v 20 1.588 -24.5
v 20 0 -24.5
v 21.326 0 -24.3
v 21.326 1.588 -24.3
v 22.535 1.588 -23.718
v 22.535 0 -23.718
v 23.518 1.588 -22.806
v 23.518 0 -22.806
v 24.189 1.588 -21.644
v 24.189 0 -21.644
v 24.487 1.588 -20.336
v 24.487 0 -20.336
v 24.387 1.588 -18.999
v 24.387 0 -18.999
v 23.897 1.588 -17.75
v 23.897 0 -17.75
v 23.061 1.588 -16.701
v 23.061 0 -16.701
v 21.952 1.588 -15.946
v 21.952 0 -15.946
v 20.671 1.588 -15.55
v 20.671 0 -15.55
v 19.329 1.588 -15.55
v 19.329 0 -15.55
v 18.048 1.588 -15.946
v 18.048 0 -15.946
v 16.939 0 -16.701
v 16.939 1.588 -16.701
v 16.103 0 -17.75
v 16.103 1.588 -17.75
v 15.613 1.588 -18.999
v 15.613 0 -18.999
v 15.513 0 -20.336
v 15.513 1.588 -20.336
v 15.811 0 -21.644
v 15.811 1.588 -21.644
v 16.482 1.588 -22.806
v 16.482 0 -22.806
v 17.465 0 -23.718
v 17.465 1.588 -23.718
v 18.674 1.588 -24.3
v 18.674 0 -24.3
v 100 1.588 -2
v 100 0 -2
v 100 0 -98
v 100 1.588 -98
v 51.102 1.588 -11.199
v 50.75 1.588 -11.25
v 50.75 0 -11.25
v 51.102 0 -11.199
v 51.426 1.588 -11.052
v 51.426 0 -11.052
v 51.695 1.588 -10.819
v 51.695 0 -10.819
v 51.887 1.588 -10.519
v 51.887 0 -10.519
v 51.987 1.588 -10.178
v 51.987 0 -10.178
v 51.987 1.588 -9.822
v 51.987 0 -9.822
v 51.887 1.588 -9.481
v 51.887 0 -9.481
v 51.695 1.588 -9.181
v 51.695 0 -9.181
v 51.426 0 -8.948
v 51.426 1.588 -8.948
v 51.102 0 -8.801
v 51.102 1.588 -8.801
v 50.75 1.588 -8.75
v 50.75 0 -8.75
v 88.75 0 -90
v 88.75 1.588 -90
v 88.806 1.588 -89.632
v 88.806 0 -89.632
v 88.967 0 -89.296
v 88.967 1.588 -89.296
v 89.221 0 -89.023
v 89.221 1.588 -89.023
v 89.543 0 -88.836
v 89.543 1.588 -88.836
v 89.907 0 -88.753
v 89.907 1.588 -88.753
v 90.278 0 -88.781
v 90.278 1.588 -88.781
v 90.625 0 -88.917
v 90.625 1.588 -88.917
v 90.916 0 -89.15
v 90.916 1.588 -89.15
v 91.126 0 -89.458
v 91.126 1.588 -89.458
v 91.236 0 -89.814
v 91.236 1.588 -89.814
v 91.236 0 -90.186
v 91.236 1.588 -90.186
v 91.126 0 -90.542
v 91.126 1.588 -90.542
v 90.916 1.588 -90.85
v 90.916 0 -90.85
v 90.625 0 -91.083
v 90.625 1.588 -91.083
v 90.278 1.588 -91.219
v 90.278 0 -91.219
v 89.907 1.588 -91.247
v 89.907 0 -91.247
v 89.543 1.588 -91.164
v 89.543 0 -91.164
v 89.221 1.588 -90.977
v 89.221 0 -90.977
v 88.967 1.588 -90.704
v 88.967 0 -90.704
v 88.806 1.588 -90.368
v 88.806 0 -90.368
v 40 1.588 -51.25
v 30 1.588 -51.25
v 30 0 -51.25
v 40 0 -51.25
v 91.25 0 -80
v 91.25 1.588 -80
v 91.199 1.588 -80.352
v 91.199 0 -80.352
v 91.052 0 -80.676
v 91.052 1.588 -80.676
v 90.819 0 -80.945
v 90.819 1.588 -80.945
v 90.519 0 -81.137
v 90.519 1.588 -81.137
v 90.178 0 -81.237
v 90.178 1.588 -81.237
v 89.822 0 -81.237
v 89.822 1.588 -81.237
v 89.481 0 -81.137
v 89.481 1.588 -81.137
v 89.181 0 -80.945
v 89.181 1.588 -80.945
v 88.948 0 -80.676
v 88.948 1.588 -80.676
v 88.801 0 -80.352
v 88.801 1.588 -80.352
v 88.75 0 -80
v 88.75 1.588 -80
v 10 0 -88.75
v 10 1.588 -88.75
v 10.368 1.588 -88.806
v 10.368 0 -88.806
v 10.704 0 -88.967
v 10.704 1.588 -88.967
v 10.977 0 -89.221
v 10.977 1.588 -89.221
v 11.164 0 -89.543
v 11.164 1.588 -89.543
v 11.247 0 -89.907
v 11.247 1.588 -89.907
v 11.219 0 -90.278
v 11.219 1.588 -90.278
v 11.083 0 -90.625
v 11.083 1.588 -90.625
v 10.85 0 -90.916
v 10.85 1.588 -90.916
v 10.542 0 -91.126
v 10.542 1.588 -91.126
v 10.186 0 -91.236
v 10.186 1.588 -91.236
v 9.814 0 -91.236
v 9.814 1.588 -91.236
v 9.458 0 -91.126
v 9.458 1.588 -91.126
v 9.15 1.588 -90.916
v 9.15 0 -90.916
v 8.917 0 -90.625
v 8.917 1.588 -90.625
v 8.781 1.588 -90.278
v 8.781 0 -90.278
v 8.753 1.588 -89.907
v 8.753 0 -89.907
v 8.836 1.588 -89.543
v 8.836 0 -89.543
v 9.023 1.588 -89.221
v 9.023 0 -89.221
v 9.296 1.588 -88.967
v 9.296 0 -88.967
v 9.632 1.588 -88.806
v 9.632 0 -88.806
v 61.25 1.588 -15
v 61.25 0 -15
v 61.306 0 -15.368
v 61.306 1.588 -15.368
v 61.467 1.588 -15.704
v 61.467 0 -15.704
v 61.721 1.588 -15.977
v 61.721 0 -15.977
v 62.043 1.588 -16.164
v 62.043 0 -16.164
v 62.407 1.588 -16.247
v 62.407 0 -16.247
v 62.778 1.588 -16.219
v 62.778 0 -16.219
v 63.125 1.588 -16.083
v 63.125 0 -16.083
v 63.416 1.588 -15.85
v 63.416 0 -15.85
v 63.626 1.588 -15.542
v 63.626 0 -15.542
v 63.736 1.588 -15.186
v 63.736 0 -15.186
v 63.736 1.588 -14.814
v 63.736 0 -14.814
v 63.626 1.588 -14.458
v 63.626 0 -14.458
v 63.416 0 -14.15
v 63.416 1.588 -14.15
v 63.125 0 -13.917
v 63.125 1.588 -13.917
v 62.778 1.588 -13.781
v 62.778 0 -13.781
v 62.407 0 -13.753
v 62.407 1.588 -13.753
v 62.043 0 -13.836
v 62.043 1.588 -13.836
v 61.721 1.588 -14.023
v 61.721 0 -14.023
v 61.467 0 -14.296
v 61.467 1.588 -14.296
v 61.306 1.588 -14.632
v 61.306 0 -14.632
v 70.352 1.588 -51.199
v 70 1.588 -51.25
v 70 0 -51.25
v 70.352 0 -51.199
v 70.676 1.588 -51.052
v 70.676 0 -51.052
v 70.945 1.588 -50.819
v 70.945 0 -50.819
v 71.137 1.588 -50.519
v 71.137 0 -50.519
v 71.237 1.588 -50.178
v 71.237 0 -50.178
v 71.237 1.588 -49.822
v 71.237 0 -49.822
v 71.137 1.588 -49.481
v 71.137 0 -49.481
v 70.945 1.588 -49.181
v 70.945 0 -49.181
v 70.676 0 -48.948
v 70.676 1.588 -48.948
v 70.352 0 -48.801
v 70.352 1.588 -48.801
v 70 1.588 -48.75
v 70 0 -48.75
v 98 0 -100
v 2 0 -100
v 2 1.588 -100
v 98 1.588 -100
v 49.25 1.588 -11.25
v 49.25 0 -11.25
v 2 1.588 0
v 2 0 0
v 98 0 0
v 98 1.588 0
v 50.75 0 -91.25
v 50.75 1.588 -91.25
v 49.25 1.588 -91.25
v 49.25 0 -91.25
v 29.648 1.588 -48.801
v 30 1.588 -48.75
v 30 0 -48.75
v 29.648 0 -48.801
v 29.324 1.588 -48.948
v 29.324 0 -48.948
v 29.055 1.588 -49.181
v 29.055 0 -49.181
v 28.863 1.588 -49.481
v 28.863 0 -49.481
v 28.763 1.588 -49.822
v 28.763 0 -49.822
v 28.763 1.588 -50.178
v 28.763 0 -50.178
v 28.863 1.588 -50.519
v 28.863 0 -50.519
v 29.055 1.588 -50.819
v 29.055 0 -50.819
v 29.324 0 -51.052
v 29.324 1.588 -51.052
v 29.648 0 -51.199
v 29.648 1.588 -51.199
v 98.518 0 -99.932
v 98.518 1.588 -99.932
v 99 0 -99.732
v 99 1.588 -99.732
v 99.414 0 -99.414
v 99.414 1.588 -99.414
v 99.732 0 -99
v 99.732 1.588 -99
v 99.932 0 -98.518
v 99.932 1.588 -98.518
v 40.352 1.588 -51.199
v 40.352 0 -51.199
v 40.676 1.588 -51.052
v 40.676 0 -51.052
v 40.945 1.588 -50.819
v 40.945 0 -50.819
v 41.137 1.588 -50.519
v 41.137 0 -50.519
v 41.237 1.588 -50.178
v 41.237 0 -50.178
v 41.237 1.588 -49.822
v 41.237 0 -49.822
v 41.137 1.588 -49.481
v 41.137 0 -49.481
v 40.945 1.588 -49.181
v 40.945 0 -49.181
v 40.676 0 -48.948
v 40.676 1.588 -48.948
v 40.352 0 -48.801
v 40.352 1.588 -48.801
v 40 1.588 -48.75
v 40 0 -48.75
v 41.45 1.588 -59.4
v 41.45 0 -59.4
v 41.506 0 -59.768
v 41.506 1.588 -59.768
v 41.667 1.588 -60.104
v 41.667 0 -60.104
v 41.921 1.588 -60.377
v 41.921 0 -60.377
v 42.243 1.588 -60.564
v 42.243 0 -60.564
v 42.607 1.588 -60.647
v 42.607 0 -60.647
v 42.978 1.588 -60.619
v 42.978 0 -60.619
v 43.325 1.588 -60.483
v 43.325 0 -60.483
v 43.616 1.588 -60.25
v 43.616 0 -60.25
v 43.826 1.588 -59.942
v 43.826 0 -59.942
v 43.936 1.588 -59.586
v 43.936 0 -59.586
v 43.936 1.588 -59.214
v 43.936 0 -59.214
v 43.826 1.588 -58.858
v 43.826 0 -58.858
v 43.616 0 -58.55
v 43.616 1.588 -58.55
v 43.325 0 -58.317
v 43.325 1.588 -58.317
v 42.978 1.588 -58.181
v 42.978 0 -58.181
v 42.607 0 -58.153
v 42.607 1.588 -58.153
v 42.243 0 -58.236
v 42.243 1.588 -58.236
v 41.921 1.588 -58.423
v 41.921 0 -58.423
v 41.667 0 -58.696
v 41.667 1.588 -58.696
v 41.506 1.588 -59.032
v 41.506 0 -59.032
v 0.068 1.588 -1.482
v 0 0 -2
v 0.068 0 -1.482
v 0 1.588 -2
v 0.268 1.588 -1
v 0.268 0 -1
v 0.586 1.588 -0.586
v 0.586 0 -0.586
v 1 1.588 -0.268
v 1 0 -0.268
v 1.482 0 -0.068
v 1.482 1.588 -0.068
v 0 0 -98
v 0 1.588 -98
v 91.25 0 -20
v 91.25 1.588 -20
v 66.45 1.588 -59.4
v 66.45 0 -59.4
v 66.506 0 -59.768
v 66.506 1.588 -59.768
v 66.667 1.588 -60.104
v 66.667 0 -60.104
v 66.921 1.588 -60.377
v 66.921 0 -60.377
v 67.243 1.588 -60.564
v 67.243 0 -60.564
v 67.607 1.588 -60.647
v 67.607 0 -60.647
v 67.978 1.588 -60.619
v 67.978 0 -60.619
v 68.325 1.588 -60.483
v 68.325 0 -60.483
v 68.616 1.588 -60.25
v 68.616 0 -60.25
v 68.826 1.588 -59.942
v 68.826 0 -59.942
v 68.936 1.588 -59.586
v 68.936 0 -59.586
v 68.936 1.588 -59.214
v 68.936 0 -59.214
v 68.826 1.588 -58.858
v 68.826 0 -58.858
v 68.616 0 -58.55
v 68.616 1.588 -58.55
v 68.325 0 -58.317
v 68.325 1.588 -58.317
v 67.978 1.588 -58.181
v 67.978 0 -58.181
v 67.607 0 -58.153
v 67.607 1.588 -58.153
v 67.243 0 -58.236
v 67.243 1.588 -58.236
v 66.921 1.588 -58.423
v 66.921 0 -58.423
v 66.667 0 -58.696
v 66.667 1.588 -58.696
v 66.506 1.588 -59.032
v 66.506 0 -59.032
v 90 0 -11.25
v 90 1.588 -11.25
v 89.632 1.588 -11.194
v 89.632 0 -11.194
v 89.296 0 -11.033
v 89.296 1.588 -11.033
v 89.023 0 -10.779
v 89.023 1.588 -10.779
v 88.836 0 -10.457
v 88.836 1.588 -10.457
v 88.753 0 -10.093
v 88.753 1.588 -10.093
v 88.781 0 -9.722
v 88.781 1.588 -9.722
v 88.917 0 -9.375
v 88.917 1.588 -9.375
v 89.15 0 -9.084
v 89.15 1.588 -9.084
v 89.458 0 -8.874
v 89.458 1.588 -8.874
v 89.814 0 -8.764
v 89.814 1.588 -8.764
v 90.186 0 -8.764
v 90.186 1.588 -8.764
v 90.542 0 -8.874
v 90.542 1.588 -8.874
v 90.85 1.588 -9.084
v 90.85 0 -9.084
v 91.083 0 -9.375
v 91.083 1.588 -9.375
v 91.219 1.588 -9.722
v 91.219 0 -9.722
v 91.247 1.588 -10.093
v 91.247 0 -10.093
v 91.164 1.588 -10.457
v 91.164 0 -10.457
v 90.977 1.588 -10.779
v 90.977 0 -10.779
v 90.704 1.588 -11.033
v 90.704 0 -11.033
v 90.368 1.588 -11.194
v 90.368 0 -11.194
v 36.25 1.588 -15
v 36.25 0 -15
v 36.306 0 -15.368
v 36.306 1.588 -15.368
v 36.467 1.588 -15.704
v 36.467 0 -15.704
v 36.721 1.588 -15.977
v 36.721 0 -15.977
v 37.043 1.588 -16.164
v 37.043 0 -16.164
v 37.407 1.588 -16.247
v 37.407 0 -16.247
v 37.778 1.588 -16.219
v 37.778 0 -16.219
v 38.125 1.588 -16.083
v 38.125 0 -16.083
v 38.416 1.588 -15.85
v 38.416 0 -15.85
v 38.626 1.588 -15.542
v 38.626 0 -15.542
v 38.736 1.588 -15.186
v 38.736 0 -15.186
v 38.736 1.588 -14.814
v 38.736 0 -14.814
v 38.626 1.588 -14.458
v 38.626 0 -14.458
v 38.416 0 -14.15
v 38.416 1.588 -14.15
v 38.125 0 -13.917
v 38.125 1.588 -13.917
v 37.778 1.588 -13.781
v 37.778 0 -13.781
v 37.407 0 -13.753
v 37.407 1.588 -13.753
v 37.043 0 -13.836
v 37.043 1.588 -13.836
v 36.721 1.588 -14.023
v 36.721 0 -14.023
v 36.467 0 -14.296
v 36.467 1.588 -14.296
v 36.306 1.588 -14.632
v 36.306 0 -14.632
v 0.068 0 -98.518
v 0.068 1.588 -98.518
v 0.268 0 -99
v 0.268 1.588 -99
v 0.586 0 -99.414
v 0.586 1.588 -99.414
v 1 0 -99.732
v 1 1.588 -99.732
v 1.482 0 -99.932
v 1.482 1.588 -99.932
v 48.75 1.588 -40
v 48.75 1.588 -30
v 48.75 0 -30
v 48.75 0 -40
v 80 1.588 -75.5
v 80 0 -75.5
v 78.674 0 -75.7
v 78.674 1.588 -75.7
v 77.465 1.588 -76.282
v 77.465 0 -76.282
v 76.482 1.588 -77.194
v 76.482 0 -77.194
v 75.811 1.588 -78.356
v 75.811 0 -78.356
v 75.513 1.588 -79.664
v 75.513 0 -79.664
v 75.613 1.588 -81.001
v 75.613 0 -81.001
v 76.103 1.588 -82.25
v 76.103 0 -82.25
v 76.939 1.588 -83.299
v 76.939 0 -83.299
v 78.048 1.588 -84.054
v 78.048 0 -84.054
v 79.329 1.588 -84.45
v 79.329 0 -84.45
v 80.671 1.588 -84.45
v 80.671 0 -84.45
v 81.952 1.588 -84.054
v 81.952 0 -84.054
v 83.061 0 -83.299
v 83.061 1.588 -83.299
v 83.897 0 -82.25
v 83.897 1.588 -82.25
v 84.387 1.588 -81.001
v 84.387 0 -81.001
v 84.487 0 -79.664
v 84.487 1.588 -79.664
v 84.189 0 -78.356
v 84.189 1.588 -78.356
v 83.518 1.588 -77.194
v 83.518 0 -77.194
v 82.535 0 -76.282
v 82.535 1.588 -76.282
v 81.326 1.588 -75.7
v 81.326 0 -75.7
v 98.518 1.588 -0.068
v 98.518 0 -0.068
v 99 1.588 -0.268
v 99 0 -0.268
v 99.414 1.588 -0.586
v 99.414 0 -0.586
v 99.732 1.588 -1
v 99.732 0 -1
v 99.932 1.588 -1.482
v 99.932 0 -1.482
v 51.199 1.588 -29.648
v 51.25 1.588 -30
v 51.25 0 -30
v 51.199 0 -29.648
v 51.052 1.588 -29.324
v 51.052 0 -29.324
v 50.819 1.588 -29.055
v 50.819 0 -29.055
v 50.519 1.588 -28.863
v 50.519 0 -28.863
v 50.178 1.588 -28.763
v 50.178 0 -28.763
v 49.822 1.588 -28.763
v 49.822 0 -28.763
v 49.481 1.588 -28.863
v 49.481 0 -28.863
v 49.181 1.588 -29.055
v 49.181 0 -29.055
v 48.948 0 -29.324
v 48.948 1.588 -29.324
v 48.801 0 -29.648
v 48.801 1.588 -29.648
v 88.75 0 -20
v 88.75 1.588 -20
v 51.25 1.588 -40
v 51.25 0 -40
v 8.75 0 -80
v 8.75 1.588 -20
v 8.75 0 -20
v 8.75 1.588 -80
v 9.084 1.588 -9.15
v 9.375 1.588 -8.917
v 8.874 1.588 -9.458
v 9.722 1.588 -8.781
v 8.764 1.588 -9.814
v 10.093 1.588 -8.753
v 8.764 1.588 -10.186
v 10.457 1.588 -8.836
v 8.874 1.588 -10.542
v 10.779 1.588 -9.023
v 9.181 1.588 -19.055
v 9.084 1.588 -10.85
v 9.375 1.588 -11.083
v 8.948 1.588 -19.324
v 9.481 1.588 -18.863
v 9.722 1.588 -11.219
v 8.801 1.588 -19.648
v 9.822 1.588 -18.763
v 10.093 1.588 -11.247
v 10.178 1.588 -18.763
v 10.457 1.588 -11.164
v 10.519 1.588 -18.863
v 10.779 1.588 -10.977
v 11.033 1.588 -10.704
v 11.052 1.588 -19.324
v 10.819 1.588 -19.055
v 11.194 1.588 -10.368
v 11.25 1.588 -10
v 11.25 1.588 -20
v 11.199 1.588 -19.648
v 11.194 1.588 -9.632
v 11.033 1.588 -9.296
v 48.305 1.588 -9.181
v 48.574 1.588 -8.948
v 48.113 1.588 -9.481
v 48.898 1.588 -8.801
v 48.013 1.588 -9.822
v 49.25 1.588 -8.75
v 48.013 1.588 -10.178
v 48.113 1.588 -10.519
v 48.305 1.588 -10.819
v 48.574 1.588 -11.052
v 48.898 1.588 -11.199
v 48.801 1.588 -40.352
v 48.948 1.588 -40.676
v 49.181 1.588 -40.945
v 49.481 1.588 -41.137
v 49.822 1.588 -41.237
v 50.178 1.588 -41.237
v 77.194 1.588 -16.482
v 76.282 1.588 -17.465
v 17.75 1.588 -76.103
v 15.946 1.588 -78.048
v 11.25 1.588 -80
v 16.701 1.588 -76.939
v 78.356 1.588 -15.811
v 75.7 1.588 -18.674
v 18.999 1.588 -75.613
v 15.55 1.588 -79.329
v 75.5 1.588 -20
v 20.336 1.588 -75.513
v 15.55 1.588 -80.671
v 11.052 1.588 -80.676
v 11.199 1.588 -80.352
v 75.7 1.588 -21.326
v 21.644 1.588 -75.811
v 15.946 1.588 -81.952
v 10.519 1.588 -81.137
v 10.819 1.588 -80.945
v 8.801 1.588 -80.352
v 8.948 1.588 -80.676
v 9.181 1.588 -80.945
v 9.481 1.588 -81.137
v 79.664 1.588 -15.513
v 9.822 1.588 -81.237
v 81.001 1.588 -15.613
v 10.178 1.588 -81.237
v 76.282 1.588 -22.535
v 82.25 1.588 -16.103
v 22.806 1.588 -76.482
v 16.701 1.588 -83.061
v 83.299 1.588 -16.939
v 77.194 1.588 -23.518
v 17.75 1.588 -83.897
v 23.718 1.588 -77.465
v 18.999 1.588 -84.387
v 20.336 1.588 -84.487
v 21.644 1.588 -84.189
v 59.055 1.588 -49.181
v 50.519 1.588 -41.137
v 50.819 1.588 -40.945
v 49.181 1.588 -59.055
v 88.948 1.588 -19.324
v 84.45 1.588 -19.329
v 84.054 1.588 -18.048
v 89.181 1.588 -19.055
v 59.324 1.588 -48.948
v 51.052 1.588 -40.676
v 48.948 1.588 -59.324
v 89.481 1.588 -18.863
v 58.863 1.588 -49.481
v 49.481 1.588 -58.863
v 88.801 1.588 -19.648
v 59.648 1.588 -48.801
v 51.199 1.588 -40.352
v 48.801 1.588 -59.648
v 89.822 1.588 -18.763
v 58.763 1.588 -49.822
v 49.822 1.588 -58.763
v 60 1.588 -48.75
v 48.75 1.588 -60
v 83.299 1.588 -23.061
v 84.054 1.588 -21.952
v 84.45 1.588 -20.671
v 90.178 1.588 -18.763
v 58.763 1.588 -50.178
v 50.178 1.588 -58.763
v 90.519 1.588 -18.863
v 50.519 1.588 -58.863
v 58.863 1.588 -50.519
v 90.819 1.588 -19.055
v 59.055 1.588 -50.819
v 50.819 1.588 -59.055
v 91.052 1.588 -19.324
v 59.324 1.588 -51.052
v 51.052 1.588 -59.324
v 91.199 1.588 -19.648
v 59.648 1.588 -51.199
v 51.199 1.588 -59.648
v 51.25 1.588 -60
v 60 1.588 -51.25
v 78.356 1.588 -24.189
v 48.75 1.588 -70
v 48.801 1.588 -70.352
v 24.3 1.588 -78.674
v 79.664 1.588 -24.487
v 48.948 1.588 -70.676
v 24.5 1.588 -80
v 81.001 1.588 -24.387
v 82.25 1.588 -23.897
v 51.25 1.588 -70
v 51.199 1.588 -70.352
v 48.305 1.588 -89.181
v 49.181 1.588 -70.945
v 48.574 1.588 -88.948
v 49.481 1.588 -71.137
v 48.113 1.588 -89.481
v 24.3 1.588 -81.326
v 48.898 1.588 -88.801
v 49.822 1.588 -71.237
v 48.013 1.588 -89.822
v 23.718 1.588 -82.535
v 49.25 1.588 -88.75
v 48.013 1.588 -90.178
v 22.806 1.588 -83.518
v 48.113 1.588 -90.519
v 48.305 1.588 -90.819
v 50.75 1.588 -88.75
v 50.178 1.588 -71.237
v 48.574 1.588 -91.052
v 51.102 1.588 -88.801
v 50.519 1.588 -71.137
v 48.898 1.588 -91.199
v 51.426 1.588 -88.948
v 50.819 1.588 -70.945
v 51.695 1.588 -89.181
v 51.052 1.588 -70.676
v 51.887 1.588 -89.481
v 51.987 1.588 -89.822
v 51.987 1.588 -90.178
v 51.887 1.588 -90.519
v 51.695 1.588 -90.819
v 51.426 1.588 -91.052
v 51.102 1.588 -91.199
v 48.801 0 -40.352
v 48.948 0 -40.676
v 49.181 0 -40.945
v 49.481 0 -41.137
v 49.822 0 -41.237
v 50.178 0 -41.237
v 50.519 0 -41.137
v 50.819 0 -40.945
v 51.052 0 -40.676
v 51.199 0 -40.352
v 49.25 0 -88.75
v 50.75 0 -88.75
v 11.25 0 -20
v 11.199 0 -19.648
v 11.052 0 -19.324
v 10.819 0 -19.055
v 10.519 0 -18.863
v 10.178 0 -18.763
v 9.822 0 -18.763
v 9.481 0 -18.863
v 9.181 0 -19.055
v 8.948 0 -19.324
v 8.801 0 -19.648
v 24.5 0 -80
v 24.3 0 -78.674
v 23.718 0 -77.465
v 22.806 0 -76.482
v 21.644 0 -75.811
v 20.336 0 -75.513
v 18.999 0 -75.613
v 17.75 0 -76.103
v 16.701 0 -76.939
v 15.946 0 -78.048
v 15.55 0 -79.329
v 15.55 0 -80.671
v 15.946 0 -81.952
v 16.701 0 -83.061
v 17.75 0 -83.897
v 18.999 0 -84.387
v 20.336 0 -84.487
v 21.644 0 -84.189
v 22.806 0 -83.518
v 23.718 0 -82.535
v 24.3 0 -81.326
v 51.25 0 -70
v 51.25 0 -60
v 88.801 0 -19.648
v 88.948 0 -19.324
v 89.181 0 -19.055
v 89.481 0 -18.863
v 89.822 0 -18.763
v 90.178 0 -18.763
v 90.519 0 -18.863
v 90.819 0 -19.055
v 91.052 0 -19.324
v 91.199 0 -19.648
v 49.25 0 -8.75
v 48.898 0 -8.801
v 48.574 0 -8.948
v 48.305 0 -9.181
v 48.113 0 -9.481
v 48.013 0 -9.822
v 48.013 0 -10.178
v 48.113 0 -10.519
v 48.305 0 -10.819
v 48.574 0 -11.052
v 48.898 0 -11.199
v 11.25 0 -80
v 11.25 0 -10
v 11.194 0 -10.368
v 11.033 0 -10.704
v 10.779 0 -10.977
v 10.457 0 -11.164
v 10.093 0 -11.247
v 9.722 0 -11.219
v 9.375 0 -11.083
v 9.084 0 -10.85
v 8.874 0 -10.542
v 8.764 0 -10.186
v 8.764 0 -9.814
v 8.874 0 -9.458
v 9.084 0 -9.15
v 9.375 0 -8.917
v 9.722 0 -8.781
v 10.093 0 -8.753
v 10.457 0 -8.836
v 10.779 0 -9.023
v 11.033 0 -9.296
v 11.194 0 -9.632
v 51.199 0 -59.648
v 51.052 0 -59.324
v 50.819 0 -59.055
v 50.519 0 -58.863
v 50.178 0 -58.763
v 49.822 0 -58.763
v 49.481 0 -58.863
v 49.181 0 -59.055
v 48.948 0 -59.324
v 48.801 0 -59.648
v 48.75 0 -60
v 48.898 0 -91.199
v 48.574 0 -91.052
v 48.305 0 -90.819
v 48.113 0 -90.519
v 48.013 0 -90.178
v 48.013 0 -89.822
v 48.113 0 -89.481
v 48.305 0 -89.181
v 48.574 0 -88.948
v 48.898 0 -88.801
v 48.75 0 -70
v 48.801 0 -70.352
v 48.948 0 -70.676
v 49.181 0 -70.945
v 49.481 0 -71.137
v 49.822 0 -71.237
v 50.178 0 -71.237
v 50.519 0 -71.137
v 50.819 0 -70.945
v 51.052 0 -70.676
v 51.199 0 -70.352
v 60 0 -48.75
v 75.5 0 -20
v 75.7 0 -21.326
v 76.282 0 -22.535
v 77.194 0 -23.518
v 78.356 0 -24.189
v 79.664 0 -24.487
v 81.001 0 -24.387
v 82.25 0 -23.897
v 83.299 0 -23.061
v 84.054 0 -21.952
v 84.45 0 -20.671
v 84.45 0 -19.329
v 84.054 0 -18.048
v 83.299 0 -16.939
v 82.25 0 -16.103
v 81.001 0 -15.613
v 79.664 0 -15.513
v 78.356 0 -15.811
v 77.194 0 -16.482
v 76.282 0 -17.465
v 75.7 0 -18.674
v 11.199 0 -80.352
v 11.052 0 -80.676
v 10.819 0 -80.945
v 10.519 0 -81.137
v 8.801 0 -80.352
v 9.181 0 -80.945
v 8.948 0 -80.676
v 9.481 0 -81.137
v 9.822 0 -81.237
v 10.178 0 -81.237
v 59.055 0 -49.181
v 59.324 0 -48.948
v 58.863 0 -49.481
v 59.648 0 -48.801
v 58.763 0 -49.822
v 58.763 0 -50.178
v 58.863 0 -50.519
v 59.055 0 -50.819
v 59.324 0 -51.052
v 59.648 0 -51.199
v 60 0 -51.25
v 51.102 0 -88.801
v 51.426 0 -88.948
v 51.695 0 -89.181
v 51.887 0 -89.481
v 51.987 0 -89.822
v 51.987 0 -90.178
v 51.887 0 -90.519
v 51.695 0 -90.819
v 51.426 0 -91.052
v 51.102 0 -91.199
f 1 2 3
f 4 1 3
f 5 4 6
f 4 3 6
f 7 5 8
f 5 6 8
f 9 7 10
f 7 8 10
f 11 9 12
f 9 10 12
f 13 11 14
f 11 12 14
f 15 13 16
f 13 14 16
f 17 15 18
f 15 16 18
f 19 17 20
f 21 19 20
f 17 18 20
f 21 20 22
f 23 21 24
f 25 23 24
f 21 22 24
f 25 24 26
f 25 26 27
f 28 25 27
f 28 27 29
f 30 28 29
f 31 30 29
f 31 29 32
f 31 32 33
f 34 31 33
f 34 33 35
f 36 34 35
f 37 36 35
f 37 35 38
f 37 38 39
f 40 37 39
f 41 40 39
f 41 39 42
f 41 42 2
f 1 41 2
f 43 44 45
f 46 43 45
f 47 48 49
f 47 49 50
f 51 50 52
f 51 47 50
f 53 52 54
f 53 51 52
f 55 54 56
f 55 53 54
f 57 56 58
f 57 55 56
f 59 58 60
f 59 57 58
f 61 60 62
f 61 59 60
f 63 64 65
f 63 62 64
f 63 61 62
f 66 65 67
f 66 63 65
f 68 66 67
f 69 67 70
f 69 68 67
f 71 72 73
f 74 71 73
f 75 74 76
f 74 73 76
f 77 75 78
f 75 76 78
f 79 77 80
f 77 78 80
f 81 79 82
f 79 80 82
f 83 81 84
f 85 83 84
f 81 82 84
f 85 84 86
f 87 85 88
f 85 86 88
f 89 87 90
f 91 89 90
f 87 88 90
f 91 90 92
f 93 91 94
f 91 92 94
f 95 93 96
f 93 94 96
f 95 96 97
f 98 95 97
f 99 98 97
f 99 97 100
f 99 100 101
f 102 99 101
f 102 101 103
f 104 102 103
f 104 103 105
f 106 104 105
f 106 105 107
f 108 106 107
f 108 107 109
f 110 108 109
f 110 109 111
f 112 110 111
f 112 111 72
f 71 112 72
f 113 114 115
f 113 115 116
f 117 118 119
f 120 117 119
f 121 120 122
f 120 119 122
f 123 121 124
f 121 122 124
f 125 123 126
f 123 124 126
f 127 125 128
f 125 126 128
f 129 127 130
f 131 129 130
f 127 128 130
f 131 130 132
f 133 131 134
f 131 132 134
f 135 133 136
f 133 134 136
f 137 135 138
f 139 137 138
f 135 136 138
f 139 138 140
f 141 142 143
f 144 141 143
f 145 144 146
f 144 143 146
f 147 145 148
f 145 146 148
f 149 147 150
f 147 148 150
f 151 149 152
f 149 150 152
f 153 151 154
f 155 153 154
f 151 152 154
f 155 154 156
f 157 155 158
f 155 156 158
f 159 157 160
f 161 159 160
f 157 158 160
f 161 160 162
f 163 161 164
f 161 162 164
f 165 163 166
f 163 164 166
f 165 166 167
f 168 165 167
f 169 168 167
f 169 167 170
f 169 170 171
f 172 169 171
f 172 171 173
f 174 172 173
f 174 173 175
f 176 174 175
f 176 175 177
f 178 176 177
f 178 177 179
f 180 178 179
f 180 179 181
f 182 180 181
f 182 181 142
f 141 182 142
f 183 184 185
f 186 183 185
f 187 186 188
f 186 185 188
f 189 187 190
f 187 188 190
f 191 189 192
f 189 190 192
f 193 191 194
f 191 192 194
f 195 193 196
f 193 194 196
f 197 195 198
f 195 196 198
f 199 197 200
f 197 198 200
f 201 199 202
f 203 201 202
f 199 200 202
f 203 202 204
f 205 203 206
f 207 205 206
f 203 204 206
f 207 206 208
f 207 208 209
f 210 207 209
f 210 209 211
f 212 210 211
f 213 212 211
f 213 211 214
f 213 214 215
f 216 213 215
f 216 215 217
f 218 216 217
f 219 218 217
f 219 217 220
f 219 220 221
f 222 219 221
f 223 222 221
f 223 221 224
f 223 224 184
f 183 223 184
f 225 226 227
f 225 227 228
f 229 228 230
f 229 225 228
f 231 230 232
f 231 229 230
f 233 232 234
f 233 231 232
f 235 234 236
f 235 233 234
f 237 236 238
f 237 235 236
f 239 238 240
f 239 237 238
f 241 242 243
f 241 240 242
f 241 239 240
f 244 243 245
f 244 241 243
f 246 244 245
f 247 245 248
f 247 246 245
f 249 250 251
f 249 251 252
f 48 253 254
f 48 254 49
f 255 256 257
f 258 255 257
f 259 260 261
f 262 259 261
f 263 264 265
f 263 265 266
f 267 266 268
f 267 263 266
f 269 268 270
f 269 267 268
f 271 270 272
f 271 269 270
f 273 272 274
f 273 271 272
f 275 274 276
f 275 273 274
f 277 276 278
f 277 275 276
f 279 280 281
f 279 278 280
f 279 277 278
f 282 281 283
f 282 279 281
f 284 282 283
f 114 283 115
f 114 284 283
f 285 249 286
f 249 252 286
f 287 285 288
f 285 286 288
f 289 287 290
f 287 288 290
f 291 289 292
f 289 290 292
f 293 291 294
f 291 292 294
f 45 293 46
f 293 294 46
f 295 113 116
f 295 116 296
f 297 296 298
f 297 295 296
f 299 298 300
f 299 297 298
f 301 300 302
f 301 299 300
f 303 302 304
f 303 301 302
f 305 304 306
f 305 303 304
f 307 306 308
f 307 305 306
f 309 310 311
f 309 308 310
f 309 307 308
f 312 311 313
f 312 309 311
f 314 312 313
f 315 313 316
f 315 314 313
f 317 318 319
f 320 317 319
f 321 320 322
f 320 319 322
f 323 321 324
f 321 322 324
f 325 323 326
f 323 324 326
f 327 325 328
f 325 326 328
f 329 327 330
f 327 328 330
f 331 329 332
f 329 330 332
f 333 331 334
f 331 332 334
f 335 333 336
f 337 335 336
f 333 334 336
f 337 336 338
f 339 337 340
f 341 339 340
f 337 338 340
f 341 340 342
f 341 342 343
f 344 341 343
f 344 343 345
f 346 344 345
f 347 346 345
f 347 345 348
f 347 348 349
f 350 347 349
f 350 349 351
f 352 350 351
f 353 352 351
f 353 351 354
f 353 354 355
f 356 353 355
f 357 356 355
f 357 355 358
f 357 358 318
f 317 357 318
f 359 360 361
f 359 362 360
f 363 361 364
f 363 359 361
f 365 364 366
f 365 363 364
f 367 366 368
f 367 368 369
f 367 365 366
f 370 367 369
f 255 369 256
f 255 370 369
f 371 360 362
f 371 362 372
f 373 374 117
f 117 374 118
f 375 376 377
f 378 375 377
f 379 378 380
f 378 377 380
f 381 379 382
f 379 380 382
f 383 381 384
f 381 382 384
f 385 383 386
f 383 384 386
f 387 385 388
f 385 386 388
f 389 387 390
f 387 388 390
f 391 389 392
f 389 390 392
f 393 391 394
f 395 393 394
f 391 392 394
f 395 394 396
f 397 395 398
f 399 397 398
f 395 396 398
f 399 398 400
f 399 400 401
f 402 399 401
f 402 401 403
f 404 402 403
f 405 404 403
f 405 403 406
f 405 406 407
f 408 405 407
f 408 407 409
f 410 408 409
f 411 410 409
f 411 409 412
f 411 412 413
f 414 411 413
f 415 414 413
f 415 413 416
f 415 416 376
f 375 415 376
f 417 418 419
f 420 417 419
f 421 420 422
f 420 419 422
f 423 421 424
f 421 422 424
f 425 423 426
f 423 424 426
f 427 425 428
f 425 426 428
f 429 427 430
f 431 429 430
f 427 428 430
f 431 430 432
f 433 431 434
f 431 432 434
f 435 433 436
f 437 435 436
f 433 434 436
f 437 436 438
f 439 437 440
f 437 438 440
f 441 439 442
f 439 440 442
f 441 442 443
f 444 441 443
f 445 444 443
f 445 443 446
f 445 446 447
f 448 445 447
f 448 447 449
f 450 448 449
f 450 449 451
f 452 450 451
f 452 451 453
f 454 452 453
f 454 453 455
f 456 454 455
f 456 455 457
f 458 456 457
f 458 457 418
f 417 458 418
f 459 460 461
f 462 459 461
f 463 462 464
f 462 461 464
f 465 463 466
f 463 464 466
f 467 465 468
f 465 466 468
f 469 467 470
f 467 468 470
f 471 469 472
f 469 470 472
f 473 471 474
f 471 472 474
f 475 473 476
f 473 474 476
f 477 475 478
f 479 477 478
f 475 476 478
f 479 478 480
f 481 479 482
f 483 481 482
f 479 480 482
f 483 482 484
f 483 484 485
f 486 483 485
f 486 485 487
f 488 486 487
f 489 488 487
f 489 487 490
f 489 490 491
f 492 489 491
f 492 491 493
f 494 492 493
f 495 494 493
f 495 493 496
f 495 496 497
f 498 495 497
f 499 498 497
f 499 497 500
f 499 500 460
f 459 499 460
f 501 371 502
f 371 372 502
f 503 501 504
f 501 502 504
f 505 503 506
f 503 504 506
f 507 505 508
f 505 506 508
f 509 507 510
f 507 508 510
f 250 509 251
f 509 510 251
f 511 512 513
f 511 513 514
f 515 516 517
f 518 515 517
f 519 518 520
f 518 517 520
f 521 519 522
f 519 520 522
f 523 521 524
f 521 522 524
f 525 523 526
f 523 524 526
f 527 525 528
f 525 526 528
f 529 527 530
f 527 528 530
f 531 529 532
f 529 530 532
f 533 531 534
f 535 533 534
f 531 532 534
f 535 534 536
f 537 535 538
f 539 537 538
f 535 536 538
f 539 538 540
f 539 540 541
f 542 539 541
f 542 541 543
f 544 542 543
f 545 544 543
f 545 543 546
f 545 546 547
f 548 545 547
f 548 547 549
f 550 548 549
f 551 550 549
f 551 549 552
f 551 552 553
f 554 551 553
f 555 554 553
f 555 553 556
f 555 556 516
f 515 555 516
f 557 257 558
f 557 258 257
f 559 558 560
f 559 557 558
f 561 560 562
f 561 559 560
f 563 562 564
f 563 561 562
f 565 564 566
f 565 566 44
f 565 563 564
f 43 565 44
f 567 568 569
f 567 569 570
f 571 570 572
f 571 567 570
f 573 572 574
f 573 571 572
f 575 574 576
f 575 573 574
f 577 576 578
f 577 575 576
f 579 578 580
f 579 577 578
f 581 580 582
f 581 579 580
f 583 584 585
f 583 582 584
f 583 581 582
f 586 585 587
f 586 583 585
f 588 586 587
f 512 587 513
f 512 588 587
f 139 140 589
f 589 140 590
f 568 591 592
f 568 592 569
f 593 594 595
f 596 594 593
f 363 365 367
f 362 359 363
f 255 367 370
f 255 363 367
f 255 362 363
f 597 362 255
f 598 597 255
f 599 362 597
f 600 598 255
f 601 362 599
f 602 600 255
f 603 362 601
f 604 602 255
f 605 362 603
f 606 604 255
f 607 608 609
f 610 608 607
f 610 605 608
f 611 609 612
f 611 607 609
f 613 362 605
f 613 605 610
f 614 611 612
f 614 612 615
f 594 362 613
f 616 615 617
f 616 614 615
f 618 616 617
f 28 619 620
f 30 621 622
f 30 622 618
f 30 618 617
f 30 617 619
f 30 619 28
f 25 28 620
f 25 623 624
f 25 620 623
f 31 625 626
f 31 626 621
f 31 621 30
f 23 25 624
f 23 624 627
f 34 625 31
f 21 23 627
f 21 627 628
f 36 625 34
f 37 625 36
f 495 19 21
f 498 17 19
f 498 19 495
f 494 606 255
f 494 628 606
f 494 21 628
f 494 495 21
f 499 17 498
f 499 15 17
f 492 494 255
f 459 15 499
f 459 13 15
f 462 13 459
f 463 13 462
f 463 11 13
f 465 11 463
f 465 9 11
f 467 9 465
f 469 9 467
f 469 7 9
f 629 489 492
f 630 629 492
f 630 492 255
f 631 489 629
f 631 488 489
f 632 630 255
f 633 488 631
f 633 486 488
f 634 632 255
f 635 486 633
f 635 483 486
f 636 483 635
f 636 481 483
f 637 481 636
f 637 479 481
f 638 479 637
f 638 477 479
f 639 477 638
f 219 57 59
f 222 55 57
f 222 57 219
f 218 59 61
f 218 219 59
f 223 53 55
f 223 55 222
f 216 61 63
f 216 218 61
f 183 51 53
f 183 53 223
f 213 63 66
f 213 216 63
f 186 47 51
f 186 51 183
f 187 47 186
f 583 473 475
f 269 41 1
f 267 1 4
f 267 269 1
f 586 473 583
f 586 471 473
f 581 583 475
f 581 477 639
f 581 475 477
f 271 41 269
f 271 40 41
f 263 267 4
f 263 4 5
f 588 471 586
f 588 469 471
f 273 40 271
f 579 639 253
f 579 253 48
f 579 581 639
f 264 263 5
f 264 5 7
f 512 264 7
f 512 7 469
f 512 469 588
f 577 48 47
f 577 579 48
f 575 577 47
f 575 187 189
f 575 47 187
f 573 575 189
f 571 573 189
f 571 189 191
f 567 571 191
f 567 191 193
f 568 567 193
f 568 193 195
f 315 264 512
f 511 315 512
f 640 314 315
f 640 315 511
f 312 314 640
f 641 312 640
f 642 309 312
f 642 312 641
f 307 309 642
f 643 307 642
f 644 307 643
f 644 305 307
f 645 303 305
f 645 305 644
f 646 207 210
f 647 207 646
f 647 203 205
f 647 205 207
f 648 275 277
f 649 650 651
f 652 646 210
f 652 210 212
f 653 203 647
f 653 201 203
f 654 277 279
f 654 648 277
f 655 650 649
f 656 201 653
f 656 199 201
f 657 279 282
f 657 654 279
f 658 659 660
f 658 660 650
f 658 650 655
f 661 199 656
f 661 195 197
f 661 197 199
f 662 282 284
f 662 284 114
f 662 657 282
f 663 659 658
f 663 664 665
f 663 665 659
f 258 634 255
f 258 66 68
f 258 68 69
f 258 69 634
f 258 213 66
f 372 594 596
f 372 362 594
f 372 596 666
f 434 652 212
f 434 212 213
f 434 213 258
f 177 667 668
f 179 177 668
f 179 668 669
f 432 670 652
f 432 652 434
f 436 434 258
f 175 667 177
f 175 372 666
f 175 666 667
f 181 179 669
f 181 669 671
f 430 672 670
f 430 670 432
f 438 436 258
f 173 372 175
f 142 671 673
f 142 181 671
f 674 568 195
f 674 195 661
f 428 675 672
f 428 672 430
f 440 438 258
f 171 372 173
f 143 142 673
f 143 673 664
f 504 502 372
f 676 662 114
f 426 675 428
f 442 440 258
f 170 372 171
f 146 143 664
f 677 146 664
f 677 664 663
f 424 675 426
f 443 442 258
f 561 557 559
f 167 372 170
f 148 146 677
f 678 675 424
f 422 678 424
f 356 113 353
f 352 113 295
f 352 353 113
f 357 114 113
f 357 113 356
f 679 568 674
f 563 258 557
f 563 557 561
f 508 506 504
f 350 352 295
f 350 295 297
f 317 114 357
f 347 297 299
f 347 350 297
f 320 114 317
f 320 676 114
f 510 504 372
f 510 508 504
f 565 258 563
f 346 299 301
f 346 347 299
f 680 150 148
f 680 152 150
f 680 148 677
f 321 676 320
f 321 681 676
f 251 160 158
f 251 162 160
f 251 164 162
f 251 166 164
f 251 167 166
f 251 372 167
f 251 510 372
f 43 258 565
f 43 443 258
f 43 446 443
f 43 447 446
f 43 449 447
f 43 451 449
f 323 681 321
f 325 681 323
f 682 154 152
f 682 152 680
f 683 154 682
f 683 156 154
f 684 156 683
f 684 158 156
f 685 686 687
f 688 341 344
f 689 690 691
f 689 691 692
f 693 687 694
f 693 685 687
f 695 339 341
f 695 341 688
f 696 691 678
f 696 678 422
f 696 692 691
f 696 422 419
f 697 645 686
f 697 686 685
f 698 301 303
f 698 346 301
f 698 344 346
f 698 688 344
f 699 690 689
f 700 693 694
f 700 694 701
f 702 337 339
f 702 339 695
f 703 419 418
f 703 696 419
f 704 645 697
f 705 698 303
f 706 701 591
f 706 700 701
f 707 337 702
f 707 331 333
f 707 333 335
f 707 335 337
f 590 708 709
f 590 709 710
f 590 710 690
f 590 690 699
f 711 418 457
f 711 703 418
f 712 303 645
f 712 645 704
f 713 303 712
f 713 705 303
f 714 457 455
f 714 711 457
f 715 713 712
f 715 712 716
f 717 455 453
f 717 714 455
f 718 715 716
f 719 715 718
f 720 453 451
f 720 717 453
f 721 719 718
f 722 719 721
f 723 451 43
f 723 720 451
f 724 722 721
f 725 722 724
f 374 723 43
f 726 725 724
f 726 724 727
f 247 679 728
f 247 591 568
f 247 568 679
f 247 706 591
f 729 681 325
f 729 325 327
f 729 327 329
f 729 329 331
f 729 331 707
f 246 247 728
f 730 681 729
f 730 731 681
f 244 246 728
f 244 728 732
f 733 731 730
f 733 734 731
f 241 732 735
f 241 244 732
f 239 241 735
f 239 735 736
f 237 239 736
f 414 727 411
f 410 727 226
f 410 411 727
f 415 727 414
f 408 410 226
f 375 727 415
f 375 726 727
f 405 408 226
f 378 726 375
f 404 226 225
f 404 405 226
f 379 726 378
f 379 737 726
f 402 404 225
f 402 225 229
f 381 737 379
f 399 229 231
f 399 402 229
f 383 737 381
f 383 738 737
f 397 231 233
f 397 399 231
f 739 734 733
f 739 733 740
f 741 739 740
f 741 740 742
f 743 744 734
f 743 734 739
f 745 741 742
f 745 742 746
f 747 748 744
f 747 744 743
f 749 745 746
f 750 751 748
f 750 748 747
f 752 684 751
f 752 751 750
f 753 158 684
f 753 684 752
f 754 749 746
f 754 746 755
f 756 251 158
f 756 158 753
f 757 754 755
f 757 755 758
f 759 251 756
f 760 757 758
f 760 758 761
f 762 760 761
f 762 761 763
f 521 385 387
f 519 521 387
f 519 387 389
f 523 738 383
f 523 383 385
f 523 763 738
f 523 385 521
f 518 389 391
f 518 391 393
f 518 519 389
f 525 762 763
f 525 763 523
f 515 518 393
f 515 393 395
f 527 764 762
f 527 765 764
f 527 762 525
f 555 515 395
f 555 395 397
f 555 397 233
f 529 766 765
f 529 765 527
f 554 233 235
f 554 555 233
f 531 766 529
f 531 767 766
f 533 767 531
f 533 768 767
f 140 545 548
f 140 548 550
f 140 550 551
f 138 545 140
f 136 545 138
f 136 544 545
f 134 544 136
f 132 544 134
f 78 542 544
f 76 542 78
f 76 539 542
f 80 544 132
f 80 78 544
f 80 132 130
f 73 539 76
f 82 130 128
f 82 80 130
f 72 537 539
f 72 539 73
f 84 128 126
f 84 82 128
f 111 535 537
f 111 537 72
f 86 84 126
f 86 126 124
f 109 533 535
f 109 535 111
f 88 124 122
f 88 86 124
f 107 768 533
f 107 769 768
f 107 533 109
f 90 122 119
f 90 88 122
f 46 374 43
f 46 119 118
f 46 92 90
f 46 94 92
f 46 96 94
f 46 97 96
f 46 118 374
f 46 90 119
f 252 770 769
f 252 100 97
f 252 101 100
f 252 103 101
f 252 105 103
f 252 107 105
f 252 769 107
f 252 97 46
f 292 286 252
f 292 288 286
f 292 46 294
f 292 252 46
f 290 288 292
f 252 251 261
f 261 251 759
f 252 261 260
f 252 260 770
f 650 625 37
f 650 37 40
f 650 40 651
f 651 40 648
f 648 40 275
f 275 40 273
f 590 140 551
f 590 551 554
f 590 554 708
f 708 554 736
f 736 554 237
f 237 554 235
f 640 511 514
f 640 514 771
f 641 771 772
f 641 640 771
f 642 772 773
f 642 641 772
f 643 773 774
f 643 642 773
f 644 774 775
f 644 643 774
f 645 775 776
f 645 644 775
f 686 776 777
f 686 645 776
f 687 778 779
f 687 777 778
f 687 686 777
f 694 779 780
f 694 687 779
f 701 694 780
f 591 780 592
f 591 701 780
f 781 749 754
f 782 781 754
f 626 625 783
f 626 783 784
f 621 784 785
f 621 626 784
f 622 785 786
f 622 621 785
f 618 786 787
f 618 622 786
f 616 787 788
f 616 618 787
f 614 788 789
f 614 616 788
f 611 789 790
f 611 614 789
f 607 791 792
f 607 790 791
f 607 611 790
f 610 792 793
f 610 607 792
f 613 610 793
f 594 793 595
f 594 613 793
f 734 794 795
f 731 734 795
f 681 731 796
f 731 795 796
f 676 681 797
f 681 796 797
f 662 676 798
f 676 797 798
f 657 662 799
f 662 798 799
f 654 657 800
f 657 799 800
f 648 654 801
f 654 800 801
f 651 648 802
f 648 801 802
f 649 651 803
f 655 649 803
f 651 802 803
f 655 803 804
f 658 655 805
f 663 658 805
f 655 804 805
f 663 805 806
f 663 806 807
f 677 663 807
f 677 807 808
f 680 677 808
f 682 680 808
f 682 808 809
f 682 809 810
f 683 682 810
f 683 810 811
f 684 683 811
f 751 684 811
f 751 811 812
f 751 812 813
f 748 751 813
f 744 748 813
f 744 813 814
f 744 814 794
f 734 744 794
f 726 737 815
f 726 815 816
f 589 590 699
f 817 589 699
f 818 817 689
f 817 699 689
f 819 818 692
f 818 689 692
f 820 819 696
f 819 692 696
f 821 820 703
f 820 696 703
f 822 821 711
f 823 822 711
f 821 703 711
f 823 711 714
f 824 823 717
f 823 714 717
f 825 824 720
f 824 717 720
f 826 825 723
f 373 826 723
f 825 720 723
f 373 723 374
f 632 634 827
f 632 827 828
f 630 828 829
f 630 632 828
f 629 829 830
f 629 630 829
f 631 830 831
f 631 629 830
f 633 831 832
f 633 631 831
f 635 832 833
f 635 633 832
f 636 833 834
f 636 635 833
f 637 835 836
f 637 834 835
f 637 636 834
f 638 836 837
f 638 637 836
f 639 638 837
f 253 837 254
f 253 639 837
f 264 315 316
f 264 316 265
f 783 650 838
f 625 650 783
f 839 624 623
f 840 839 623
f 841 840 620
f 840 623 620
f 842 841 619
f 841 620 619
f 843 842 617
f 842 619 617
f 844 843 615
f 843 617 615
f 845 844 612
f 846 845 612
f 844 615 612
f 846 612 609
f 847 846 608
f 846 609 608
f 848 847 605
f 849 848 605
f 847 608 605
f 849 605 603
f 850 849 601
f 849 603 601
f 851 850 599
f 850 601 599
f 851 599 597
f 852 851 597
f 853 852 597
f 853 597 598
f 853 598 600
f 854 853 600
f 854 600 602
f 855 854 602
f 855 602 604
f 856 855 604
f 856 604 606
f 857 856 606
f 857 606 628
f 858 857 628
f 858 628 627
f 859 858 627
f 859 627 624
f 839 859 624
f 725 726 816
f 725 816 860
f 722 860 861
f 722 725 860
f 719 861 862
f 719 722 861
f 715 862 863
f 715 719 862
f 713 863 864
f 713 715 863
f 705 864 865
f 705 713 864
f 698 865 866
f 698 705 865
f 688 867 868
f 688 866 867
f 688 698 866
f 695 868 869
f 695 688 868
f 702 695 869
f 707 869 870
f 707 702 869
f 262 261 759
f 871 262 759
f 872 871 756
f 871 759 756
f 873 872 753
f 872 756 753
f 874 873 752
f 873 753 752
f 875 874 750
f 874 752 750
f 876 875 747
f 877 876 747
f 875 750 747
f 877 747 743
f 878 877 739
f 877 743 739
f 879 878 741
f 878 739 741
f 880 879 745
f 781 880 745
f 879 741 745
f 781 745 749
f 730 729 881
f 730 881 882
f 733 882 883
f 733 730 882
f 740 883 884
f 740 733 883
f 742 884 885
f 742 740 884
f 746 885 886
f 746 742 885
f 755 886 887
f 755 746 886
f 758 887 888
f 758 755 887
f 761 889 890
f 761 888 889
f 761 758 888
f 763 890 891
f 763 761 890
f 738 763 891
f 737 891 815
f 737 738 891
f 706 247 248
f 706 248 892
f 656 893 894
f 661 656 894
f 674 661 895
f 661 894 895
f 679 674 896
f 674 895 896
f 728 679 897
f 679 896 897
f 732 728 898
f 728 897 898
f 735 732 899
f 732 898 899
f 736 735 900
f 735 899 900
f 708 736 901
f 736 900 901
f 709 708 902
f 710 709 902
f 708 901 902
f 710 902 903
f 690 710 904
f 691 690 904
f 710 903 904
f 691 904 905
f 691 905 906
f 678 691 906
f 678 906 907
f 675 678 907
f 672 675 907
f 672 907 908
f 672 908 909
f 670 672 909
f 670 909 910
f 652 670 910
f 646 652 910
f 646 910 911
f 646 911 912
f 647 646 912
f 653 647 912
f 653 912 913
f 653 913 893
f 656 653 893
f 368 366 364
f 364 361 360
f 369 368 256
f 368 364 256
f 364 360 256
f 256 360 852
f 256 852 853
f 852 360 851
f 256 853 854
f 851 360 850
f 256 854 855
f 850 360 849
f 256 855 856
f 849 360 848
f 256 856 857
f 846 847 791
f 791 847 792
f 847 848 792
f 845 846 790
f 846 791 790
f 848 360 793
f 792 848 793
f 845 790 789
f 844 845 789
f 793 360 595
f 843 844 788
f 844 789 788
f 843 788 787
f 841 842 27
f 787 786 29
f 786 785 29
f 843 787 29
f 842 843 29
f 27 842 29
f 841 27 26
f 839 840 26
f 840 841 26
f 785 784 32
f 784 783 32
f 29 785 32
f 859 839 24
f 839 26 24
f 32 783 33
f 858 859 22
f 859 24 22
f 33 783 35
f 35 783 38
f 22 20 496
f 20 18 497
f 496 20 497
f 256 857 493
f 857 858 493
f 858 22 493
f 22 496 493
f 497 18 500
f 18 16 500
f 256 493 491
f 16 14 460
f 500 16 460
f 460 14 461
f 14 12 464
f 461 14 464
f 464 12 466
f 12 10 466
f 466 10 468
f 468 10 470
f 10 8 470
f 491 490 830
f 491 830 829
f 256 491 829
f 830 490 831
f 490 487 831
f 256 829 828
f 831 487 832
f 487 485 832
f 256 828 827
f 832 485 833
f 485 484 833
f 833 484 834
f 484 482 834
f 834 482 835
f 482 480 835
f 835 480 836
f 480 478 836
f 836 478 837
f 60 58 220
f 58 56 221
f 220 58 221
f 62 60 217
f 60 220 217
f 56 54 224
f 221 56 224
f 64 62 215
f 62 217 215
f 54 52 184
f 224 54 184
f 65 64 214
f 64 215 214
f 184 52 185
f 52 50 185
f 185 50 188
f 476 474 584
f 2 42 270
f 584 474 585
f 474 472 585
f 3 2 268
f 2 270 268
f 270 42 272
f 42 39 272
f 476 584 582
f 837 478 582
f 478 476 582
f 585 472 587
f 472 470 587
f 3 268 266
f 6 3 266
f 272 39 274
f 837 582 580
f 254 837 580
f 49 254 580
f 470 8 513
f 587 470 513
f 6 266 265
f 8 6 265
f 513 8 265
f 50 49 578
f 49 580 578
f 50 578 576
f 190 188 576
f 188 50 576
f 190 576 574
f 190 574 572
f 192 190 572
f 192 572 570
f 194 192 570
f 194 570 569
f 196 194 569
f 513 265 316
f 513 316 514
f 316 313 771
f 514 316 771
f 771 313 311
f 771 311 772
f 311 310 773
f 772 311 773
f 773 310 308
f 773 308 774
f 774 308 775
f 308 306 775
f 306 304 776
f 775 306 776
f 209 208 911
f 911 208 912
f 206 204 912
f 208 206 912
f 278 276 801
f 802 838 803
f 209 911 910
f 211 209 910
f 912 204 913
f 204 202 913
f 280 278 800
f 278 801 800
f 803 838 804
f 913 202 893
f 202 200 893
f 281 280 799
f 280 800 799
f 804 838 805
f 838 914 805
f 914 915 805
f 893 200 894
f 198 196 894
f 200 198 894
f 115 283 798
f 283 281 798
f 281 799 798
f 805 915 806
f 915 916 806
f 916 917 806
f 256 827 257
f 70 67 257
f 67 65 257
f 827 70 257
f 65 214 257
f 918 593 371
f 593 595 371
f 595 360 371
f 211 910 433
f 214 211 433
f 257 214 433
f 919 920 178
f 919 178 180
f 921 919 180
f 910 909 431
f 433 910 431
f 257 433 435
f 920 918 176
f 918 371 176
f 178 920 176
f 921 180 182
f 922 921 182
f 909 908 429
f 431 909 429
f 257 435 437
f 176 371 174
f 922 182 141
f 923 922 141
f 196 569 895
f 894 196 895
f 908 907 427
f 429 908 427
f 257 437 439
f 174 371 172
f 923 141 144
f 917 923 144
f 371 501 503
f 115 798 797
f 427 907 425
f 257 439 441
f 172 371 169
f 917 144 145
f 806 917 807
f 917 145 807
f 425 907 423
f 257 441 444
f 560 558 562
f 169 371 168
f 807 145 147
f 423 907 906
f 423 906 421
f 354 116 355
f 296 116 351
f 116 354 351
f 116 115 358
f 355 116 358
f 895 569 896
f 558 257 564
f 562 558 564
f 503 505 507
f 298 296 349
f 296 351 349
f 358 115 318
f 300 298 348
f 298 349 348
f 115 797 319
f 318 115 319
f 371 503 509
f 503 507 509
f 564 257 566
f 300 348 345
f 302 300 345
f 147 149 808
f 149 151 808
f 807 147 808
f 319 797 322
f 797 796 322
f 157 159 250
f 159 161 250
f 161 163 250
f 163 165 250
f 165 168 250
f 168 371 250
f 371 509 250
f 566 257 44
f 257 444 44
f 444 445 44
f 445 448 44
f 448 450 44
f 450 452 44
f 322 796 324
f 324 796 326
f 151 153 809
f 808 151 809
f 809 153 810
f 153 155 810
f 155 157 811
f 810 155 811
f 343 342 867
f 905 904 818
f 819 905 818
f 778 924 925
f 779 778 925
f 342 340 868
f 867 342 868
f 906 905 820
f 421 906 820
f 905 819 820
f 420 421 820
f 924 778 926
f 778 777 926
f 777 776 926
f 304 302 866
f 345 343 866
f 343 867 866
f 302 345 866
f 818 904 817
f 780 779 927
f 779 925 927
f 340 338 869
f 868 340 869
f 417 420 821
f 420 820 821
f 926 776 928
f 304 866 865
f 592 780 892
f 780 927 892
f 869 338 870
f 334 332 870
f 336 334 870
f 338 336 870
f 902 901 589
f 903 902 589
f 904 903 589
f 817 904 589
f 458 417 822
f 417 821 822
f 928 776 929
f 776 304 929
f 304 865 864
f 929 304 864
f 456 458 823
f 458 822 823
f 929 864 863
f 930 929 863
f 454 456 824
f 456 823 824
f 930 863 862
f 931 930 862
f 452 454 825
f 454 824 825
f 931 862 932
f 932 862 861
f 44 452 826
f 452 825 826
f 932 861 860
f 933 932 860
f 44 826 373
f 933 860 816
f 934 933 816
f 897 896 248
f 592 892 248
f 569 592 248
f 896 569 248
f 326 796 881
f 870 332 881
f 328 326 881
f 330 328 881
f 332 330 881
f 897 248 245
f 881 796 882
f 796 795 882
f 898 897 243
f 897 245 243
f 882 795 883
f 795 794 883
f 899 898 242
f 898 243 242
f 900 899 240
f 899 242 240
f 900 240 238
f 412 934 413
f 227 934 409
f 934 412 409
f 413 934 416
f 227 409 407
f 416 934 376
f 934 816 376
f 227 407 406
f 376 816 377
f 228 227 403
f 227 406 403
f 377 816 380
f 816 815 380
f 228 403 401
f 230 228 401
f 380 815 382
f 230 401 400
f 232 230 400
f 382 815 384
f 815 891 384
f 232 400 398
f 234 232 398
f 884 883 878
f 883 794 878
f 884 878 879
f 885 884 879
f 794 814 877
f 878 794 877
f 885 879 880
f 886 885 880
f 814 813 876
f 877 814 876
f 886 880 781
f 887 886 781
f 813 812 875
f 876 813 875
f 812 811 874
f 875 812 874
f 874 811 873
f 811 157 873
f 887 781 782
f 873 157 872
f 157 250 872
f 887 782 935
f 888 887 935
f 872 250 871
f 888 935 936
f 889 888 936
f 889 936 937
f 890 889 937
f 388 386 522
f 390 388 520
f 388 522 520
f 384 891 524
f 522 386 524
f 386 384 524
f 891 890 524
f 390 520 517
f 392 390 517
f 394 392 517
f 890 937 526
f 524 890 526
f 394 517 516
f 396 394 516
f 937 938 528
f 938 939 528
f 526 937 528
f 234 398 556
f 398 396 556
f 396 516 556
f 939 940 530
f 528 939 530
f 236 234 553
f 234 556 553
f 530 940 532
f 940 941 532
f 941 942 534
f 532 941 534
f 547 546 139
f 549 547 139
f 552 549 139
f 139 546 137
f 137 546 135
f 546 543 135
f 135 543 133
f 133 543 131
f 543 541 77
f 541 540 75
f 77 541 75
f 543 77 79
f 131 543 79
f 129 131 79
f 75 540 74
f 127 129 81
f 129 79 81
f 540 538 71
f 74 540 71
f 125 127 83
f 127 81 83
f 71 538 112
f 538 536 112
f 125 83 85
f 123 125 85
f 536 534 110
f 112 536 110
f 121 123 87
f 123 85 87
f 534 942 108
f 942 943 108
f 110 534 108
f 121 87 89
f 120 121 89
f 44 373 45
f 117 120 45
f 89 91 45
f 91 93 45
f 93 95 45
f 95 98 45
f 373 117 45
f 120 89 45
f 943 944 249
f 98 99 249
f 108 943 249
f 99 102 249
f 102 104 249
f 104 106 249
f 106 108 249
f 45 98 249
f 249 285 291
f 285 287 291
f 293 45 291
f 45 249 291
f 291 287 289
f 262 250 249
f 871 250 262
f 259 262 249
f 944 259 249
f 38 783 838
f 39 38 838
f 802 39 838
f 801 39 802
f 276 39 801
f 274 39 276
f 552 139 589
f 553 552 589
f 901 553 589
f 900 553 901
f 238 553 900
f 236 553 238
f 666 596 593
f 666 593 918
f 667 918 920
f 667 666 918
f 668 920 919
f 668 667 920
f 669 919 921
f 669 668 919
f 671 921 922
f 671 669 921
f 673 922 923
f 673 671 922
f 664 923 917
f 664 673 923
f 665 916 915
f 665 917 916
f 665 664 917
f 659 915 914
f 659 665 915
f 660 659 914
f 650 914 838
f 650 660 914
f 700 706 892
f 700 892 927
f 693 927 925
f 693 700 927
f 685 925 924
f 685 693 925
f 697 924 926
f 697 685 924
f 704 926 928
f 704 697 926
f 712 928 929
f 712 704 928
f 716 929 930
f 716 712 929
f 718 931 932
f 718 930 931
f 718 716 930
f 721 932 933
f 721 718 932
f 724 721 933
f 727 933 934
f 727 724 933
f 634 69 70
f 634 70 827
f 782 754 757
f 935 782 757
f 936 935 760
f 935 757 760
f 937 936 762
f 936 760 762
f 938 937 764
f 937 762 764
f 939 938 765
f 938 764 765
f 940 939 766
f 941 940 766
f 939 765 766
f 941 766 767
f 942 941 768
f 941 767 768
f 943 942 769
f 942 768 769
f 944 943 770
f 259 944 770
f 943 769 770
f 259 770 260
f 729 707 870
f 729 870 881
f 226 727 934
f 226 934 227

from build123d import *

# Parameters (mm, degrees)
SKETCH2_W                = 100
SKETCH2_H                = 100
BOSS_EXTRUDE1_DEPTH      = 1.5875
CUT_EXTRUDE1_DEPTH       = 5
SKETCH4_R                = 1.25
CUT_EXTRUDE2_DEPTH       = 5
CUT_EXTRUDE4_DEPTH       = 5
CUT_EXTRUDE6_DEPTH       = 5
CIRPATTERN1_COUNT        = 4
CIRPATTERN4_COUNT        = 4
FILLET2_R                = 2
F_2_5MM_DOWEL_HOLE1_D    = 2.5
F_2_5MM_DOWEL_HOLE2_D    = 2.5
F_9_0_9_DIAMETER_HOLE1_D = 9
CIRPATTERN5_COUNT        = 4


with BuildPart() as part:
    # Sketch2 → Boss-Extrude1 (new body)
    with BuildSketch(Plane(origin=(0, 0, 0), x_dir=(1, 0, 0), z_dir=(0, 1, 0))):
        with Locations((50, 50)):
            Rectangle(SKETCH2_W, SKETCH2_H)
    extrude(amount=BOSS_EXTRUDE1_DEPTH)

    # Sketch3 → Cut-Extrude1 (cut)
    with BuildSketch(Plane(origin=(0, 1.5875, 0), x_dir=(1, 0, 0), z_dir=(0, 1, 0))):
        with BuildLine():
            Line((11.25, 80), (11.25, 20))
            ThreePointArc((11.25, 20), (10, 18.75), (8.75, 20))
            Line((8.75, 20), (8.75, 80))
            ThreePointArc((8.75, 80), (10, 81.25), (11.25, 80))
        make_face()
    cut_extrude1 = extrude(amount=-CUT_EXTRUDE1_DEPTH, mode=Mode.SUBTRACT)

    # Sketch4 → Cut-Extrude2 (cut)
    with BuildSketch(Plane(origin=(0, 1.5875, 0), x_dir=(1, 0, 0), z_dir=(0, 1, 0))):
        with Locations((10, 10)):
            Circle(SKETCH4_R)
    cut_extrude2 = extrude(amount=-CUT_EXTRUDE2_DEPTH, mode=Mode.SUBTRACT)

    # Sketch6 → Cut-Extrude4 (cut)
    with BuildSketch(Plane(origin=(0, 1.5875, 0), x_dir=(1, 0, 0), z_dir=(0, 1, 0))):
        with BuildLine():
            Line((49.25, 11.25), (50.75, 11.25))
            ThreePointArc((50.75, 11.25), (52, 10), (50.75, 8.75))
            Line((50.75, 8.75), (49.25, 8.75))
            ThreePointArc((49.25, 8.75), (48, 10), (49.25, 11.25))
        make_face()
    cut_extrude4 = extrude(amount=-CUT_EXTRUDE4_DEPTH, mode=Mode.SUBTRACT)

    # Sketch8 → Cut-Extrude6 (cut)
    with BuildSketch(Plane(origin=(0, 1.5875, 0), x_dir=(1, 0, 0), z_dir=(0, 1, 0))):
        with BuildLine():
            Line((30, 51.25), (40, 51.25))
            ThreePointArc((40, 51.25), (41.25, 50), (40, 48.75))
            Line((40, 48.75), (30, 48.75))
            ThreePointArc((30, 48.75), (28.75, 50), (30, 51.25))
        make_face()
    cut_extrude6 = extrude(amount=-CUT_EXTRUDE6_DEPTH, mode=Mode.SUBTRACT)

    # Mirror3: Cut-Extrude1 across plane
    add(cut_extrude1.mirror(Plane(origin=(50, 0, 0), x_dir=(0, 0, 1), z_dir=(1, 0, 0))), mode=Mode.SUBTRACT)

    # CirPattern1: Cut-Extrude6 ×4 about axis
    cirpattern1_axis = Axis((50, -0.2, -50), (0, 1, 0))
    for i in range(1, CIRPATTERN1_COUNT):
        add(cut_extrude6.rotate(cirpattern1_axis, i * 360 / CIRPATTERN1_COUNT), mode=Mode.SUBTRACT)

    # CirPattern4: Cut-Extrude2 ×4 about axis
    cirpattern4_axis = Axis((50, -0.2, -50), (0, 1, 0))
    for i in range(1, CIRPATTERN4_COUNT):
        add(cut_extrude2.rotate(cirpattern4_axis, i * 360 / CIRPATTERN4_COUNT), mode=Mode.SUBTRACT)

    # Mirror6: Cut-Extrude4 across plane
    add(cut_extrude4.mirror(Plane(origin=(0, 0, -50), x_dir=(1, 0, 0), z_dir=(0, 0, -1))), mode=Mode.SUBTRACT)

    # Fillet2
    fillet2_edges = [part.edges().sort_by_distance(p)[0] for p in [
        (100, 0.79375, 0),
        (0, 0.79375, 0),
        (0, 0.79375, -100),
        (100, 0.79375, -100),
    ]]
    fillet(fillet2_edges, radius=FILLET2_R)

    # Ø2.5mm Dowel Hole1 (through all)
    with Locations(Plane(origin=(0, 1.5875, 0), x_dir=(1, 0, 0), z_dir=(0, 1, 0))):
        with Locations((62.5, 15), (37.5, 15)):
            Hole(F_2_5MM_DOWEL_HOLE1_D / 2)

    # Ø2.5mm Dowel Hole2 (through all)
    with Locations(Plane(origin=(0, 1.5875, 0), x_dir=(1, 0, 0), z_dir=(0, 1, 0))):
        with Locations((42.7, 59.4), (67.7, 59.4)):
            Hole(F_2_5MM_DOWEL_HOLE2_D / 2)

    # Ø9.0 (9) Diameter Hole1 (through all)
    with Locations(Plane(origin=(0, 1.5875, 0), x_dir=(1, 0, 0), z_dir=(0, 1, 0))):
        with Locations((80, 20)):
            f_9_0_9_diameter_hole1 = Hole(F_9_0_9_DIAMETER_HOLE1_D / 2)

    # CirPattern5: Ø9.0 (9) Diameter Hole1 ×4 about axis
    cirpattern5_axis = Axis((50, -0.2, -50), (0, 1, 0))
    for i in range(1, CIRPATTERN5_COUNT):
        add(f_9_0_9_diameter_hole1.rotate(cirpattern5_axis, i * 360 / CIRPATTERN5_COUNT), mode=Mode.SUBTRACT)


solid = part.part
